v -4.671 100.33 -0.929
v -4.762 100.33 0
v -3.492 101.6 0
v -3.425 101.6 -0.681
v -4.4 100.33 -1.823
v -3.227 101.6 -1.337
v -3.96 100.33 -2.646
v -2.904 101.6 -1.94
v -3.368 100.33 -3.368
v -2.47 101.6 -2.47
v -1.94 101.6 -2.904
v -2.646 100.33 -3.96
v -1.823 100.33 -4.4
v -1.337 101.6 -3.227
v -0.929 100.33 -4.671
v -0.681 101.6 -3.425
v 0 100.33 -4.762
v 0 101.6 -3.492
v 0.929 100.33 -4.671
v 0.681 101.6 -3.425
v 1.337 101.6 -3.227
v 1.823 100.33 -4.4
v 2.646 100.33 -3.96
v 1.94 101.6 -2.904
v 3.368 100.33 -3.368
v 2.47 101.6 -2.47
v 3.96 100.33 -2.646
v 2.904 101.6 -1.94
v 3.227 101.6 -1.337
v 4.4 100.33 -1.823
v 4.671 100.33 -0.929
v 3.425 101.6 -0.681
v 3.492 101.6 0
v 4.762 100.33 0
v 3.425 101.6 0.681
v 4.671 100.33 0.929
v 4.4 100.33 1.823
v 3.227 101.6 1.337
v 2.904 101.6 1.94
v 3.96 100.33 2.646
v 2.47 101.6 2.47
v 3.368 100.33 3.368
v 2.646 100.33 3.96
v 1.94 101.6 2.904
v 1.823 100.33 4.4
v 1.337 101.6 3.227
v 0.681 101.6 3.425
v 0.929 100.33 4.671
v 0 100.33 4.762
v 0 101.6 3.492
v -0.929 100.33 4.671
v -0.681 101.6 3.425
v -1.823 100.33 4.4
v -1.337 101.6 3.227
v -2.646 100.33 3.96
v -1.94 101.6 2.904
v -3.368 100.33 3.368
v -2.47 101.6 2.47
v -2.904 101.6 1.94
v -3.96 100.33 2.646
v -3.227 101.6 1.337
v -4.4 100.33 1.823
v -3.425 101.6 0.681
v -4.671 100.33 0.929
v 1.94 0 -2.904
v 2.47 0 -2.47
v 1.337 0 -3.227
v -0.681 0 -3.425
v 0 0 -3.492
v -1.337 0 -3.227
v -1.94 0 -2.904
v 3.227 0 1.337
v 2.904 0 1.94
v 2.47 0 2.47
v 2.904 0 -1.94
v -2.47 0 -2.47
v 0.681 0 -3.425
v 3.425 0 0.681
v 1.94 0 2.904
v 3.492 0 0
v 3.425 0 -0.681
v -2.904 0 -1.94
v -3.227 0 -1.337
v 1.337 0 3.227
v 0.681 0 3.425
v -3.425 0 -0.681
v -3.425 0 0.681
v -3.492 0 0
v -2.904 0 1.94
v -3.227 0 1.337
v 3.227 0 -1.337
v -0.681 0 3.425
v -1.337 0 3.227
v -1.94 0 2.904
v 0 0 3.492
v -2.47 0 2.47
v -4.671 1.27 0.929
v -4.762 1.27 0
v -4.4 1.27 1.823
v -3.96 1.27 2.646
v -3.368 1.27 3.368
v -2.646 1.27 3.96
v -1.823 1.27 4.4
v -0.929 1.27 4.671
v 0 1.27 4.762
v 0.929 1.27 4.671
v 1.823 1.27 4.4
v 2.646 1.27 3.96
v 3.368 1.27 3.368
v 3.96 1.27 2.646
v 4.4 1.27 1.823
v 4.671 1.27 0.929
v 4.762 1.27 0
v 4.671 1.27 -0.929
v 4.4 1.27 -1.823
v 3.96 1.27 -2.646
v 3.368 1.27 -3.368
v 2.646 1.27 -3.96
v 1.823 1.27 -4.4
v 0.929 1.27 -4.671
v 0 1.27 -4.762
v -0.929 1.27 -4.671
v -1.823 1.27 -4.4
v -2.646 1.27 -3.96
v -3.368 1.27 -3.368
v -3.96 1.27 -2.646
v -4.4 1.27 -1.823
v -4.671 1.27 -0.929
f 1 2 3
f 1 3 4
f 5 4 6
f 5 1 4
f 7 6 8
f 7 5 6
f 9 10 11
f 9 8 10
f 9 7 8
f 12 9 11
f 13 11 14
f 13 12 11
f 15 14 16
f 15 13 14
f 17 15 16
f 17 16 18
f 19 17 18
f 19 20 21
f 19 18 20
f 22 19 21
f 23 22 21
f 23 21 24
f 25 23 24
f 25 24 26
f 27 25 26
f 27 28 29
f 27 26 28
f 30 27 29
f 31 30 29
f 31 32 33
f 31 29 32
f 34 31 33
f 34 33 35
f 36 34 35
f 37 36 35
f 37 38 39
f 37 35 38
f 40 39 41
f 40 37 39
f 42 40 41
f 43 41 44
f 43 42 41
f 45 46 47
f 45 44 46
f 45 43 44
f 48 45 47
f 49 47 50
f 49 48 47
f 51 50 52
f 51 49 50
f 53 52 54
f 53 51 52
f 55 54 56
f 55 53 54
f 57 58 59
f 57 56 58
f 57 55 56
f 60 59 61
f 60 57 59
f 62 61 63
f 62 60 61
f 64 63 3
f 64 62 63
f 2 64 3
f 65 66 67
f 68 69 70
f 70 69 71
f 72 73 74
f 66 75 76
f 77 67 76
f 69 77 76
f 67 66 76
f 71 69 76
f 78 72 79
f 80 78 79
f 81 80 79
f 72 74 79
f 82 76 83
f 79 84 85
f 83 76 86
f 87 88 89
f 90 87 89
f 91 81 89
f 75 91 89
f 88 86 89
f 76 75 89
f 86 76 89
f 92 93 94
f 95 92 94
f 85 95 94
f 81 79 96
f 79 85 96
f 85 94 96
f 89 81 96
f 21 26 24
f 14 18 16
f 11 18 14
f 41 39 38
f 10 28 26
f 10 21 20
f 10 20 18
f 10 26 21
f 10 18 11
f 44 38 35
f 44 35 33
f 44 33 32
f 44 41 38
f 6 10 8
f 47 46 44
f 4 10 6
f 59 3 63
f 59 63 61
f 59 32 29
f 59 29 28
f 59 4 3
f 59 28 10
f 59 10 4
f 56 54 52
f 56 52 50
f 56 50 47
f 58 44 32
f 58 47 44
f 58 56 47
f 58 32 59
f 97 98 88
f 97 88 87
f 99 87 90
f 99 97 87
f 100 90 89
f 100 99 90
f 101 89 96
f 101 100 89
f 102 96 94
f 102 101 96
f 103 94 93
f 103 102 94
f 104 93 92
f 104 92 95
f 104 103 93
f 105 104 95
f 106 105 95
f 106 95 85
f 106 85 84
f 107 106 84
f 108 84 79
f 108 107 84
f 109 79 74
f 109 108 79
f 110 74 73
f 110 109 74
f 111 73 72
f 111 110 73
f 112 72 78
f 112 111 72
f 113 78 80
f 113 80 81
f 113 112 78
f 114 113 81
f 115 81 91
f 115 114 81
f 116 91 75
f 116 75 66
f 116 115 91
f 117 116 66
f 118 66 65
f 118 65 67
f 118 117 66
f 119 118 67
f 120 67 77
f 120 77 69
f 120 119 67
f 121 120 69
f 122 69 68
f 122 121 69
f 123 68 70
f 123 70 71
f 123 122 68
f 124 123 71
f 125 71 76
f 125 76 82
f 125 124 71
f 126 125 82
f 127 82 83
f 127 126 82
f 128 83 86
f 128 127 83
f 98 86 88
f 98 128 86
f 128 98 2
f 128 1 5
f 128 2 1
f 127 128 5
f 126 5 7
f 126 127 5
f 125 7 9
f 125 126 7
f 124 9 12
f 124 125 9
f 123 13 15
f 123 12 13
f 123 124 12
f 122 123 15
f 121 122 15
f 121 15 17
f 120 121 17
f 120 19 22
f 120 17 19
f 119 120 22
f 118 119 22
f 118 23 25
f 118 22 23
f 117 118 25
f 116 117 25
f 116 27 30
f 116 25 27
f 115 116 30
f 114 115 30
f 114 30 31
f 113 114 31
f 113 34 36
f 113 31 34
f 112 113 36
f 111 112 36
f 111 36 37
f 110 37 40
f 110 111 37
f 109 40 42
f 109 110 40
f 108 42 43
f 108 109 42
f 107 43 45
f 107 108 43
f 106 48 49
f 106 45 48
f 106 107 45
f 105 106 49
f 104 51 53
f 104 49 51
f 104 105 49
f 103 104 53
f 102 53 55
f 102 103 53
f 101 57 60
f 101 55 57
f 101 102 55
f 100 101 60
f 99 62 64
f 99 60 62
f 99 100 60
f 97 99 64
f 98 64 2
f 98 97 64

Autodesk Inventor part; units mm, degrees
ref_plane "YZ Plane" through (0, 0, 0) normal (1, 0, 0) x (0, 1, 0)
ref_plane "XZ Plane" through (0, 0, 0) normal (0, 1, 0) x (-1, 0, 0)
ref_plane "XY Plane" through (0, 0, 0) normal (0, 0, 1) x (1, 0, 0)
sketch "Sketch1" plane through (0, 0, 0) normal (0, 1, 0) x (-1, 0, 0)
  circle A0 centre (0, 0) radius 4.7625
  dimension "d0" = 9.525
extrude "Extrusion1" add sketch "Sketch1" along normal blind 101.6
chamfer "Chamfer1" distance 1.27 angle 45 1 edges at (4.7625, 101.6, 0)
chamfer "Chamfer2" distance 1.27 angle 45 1 edges at (4.7625, 0, 0)
properties part number "38shaft"
